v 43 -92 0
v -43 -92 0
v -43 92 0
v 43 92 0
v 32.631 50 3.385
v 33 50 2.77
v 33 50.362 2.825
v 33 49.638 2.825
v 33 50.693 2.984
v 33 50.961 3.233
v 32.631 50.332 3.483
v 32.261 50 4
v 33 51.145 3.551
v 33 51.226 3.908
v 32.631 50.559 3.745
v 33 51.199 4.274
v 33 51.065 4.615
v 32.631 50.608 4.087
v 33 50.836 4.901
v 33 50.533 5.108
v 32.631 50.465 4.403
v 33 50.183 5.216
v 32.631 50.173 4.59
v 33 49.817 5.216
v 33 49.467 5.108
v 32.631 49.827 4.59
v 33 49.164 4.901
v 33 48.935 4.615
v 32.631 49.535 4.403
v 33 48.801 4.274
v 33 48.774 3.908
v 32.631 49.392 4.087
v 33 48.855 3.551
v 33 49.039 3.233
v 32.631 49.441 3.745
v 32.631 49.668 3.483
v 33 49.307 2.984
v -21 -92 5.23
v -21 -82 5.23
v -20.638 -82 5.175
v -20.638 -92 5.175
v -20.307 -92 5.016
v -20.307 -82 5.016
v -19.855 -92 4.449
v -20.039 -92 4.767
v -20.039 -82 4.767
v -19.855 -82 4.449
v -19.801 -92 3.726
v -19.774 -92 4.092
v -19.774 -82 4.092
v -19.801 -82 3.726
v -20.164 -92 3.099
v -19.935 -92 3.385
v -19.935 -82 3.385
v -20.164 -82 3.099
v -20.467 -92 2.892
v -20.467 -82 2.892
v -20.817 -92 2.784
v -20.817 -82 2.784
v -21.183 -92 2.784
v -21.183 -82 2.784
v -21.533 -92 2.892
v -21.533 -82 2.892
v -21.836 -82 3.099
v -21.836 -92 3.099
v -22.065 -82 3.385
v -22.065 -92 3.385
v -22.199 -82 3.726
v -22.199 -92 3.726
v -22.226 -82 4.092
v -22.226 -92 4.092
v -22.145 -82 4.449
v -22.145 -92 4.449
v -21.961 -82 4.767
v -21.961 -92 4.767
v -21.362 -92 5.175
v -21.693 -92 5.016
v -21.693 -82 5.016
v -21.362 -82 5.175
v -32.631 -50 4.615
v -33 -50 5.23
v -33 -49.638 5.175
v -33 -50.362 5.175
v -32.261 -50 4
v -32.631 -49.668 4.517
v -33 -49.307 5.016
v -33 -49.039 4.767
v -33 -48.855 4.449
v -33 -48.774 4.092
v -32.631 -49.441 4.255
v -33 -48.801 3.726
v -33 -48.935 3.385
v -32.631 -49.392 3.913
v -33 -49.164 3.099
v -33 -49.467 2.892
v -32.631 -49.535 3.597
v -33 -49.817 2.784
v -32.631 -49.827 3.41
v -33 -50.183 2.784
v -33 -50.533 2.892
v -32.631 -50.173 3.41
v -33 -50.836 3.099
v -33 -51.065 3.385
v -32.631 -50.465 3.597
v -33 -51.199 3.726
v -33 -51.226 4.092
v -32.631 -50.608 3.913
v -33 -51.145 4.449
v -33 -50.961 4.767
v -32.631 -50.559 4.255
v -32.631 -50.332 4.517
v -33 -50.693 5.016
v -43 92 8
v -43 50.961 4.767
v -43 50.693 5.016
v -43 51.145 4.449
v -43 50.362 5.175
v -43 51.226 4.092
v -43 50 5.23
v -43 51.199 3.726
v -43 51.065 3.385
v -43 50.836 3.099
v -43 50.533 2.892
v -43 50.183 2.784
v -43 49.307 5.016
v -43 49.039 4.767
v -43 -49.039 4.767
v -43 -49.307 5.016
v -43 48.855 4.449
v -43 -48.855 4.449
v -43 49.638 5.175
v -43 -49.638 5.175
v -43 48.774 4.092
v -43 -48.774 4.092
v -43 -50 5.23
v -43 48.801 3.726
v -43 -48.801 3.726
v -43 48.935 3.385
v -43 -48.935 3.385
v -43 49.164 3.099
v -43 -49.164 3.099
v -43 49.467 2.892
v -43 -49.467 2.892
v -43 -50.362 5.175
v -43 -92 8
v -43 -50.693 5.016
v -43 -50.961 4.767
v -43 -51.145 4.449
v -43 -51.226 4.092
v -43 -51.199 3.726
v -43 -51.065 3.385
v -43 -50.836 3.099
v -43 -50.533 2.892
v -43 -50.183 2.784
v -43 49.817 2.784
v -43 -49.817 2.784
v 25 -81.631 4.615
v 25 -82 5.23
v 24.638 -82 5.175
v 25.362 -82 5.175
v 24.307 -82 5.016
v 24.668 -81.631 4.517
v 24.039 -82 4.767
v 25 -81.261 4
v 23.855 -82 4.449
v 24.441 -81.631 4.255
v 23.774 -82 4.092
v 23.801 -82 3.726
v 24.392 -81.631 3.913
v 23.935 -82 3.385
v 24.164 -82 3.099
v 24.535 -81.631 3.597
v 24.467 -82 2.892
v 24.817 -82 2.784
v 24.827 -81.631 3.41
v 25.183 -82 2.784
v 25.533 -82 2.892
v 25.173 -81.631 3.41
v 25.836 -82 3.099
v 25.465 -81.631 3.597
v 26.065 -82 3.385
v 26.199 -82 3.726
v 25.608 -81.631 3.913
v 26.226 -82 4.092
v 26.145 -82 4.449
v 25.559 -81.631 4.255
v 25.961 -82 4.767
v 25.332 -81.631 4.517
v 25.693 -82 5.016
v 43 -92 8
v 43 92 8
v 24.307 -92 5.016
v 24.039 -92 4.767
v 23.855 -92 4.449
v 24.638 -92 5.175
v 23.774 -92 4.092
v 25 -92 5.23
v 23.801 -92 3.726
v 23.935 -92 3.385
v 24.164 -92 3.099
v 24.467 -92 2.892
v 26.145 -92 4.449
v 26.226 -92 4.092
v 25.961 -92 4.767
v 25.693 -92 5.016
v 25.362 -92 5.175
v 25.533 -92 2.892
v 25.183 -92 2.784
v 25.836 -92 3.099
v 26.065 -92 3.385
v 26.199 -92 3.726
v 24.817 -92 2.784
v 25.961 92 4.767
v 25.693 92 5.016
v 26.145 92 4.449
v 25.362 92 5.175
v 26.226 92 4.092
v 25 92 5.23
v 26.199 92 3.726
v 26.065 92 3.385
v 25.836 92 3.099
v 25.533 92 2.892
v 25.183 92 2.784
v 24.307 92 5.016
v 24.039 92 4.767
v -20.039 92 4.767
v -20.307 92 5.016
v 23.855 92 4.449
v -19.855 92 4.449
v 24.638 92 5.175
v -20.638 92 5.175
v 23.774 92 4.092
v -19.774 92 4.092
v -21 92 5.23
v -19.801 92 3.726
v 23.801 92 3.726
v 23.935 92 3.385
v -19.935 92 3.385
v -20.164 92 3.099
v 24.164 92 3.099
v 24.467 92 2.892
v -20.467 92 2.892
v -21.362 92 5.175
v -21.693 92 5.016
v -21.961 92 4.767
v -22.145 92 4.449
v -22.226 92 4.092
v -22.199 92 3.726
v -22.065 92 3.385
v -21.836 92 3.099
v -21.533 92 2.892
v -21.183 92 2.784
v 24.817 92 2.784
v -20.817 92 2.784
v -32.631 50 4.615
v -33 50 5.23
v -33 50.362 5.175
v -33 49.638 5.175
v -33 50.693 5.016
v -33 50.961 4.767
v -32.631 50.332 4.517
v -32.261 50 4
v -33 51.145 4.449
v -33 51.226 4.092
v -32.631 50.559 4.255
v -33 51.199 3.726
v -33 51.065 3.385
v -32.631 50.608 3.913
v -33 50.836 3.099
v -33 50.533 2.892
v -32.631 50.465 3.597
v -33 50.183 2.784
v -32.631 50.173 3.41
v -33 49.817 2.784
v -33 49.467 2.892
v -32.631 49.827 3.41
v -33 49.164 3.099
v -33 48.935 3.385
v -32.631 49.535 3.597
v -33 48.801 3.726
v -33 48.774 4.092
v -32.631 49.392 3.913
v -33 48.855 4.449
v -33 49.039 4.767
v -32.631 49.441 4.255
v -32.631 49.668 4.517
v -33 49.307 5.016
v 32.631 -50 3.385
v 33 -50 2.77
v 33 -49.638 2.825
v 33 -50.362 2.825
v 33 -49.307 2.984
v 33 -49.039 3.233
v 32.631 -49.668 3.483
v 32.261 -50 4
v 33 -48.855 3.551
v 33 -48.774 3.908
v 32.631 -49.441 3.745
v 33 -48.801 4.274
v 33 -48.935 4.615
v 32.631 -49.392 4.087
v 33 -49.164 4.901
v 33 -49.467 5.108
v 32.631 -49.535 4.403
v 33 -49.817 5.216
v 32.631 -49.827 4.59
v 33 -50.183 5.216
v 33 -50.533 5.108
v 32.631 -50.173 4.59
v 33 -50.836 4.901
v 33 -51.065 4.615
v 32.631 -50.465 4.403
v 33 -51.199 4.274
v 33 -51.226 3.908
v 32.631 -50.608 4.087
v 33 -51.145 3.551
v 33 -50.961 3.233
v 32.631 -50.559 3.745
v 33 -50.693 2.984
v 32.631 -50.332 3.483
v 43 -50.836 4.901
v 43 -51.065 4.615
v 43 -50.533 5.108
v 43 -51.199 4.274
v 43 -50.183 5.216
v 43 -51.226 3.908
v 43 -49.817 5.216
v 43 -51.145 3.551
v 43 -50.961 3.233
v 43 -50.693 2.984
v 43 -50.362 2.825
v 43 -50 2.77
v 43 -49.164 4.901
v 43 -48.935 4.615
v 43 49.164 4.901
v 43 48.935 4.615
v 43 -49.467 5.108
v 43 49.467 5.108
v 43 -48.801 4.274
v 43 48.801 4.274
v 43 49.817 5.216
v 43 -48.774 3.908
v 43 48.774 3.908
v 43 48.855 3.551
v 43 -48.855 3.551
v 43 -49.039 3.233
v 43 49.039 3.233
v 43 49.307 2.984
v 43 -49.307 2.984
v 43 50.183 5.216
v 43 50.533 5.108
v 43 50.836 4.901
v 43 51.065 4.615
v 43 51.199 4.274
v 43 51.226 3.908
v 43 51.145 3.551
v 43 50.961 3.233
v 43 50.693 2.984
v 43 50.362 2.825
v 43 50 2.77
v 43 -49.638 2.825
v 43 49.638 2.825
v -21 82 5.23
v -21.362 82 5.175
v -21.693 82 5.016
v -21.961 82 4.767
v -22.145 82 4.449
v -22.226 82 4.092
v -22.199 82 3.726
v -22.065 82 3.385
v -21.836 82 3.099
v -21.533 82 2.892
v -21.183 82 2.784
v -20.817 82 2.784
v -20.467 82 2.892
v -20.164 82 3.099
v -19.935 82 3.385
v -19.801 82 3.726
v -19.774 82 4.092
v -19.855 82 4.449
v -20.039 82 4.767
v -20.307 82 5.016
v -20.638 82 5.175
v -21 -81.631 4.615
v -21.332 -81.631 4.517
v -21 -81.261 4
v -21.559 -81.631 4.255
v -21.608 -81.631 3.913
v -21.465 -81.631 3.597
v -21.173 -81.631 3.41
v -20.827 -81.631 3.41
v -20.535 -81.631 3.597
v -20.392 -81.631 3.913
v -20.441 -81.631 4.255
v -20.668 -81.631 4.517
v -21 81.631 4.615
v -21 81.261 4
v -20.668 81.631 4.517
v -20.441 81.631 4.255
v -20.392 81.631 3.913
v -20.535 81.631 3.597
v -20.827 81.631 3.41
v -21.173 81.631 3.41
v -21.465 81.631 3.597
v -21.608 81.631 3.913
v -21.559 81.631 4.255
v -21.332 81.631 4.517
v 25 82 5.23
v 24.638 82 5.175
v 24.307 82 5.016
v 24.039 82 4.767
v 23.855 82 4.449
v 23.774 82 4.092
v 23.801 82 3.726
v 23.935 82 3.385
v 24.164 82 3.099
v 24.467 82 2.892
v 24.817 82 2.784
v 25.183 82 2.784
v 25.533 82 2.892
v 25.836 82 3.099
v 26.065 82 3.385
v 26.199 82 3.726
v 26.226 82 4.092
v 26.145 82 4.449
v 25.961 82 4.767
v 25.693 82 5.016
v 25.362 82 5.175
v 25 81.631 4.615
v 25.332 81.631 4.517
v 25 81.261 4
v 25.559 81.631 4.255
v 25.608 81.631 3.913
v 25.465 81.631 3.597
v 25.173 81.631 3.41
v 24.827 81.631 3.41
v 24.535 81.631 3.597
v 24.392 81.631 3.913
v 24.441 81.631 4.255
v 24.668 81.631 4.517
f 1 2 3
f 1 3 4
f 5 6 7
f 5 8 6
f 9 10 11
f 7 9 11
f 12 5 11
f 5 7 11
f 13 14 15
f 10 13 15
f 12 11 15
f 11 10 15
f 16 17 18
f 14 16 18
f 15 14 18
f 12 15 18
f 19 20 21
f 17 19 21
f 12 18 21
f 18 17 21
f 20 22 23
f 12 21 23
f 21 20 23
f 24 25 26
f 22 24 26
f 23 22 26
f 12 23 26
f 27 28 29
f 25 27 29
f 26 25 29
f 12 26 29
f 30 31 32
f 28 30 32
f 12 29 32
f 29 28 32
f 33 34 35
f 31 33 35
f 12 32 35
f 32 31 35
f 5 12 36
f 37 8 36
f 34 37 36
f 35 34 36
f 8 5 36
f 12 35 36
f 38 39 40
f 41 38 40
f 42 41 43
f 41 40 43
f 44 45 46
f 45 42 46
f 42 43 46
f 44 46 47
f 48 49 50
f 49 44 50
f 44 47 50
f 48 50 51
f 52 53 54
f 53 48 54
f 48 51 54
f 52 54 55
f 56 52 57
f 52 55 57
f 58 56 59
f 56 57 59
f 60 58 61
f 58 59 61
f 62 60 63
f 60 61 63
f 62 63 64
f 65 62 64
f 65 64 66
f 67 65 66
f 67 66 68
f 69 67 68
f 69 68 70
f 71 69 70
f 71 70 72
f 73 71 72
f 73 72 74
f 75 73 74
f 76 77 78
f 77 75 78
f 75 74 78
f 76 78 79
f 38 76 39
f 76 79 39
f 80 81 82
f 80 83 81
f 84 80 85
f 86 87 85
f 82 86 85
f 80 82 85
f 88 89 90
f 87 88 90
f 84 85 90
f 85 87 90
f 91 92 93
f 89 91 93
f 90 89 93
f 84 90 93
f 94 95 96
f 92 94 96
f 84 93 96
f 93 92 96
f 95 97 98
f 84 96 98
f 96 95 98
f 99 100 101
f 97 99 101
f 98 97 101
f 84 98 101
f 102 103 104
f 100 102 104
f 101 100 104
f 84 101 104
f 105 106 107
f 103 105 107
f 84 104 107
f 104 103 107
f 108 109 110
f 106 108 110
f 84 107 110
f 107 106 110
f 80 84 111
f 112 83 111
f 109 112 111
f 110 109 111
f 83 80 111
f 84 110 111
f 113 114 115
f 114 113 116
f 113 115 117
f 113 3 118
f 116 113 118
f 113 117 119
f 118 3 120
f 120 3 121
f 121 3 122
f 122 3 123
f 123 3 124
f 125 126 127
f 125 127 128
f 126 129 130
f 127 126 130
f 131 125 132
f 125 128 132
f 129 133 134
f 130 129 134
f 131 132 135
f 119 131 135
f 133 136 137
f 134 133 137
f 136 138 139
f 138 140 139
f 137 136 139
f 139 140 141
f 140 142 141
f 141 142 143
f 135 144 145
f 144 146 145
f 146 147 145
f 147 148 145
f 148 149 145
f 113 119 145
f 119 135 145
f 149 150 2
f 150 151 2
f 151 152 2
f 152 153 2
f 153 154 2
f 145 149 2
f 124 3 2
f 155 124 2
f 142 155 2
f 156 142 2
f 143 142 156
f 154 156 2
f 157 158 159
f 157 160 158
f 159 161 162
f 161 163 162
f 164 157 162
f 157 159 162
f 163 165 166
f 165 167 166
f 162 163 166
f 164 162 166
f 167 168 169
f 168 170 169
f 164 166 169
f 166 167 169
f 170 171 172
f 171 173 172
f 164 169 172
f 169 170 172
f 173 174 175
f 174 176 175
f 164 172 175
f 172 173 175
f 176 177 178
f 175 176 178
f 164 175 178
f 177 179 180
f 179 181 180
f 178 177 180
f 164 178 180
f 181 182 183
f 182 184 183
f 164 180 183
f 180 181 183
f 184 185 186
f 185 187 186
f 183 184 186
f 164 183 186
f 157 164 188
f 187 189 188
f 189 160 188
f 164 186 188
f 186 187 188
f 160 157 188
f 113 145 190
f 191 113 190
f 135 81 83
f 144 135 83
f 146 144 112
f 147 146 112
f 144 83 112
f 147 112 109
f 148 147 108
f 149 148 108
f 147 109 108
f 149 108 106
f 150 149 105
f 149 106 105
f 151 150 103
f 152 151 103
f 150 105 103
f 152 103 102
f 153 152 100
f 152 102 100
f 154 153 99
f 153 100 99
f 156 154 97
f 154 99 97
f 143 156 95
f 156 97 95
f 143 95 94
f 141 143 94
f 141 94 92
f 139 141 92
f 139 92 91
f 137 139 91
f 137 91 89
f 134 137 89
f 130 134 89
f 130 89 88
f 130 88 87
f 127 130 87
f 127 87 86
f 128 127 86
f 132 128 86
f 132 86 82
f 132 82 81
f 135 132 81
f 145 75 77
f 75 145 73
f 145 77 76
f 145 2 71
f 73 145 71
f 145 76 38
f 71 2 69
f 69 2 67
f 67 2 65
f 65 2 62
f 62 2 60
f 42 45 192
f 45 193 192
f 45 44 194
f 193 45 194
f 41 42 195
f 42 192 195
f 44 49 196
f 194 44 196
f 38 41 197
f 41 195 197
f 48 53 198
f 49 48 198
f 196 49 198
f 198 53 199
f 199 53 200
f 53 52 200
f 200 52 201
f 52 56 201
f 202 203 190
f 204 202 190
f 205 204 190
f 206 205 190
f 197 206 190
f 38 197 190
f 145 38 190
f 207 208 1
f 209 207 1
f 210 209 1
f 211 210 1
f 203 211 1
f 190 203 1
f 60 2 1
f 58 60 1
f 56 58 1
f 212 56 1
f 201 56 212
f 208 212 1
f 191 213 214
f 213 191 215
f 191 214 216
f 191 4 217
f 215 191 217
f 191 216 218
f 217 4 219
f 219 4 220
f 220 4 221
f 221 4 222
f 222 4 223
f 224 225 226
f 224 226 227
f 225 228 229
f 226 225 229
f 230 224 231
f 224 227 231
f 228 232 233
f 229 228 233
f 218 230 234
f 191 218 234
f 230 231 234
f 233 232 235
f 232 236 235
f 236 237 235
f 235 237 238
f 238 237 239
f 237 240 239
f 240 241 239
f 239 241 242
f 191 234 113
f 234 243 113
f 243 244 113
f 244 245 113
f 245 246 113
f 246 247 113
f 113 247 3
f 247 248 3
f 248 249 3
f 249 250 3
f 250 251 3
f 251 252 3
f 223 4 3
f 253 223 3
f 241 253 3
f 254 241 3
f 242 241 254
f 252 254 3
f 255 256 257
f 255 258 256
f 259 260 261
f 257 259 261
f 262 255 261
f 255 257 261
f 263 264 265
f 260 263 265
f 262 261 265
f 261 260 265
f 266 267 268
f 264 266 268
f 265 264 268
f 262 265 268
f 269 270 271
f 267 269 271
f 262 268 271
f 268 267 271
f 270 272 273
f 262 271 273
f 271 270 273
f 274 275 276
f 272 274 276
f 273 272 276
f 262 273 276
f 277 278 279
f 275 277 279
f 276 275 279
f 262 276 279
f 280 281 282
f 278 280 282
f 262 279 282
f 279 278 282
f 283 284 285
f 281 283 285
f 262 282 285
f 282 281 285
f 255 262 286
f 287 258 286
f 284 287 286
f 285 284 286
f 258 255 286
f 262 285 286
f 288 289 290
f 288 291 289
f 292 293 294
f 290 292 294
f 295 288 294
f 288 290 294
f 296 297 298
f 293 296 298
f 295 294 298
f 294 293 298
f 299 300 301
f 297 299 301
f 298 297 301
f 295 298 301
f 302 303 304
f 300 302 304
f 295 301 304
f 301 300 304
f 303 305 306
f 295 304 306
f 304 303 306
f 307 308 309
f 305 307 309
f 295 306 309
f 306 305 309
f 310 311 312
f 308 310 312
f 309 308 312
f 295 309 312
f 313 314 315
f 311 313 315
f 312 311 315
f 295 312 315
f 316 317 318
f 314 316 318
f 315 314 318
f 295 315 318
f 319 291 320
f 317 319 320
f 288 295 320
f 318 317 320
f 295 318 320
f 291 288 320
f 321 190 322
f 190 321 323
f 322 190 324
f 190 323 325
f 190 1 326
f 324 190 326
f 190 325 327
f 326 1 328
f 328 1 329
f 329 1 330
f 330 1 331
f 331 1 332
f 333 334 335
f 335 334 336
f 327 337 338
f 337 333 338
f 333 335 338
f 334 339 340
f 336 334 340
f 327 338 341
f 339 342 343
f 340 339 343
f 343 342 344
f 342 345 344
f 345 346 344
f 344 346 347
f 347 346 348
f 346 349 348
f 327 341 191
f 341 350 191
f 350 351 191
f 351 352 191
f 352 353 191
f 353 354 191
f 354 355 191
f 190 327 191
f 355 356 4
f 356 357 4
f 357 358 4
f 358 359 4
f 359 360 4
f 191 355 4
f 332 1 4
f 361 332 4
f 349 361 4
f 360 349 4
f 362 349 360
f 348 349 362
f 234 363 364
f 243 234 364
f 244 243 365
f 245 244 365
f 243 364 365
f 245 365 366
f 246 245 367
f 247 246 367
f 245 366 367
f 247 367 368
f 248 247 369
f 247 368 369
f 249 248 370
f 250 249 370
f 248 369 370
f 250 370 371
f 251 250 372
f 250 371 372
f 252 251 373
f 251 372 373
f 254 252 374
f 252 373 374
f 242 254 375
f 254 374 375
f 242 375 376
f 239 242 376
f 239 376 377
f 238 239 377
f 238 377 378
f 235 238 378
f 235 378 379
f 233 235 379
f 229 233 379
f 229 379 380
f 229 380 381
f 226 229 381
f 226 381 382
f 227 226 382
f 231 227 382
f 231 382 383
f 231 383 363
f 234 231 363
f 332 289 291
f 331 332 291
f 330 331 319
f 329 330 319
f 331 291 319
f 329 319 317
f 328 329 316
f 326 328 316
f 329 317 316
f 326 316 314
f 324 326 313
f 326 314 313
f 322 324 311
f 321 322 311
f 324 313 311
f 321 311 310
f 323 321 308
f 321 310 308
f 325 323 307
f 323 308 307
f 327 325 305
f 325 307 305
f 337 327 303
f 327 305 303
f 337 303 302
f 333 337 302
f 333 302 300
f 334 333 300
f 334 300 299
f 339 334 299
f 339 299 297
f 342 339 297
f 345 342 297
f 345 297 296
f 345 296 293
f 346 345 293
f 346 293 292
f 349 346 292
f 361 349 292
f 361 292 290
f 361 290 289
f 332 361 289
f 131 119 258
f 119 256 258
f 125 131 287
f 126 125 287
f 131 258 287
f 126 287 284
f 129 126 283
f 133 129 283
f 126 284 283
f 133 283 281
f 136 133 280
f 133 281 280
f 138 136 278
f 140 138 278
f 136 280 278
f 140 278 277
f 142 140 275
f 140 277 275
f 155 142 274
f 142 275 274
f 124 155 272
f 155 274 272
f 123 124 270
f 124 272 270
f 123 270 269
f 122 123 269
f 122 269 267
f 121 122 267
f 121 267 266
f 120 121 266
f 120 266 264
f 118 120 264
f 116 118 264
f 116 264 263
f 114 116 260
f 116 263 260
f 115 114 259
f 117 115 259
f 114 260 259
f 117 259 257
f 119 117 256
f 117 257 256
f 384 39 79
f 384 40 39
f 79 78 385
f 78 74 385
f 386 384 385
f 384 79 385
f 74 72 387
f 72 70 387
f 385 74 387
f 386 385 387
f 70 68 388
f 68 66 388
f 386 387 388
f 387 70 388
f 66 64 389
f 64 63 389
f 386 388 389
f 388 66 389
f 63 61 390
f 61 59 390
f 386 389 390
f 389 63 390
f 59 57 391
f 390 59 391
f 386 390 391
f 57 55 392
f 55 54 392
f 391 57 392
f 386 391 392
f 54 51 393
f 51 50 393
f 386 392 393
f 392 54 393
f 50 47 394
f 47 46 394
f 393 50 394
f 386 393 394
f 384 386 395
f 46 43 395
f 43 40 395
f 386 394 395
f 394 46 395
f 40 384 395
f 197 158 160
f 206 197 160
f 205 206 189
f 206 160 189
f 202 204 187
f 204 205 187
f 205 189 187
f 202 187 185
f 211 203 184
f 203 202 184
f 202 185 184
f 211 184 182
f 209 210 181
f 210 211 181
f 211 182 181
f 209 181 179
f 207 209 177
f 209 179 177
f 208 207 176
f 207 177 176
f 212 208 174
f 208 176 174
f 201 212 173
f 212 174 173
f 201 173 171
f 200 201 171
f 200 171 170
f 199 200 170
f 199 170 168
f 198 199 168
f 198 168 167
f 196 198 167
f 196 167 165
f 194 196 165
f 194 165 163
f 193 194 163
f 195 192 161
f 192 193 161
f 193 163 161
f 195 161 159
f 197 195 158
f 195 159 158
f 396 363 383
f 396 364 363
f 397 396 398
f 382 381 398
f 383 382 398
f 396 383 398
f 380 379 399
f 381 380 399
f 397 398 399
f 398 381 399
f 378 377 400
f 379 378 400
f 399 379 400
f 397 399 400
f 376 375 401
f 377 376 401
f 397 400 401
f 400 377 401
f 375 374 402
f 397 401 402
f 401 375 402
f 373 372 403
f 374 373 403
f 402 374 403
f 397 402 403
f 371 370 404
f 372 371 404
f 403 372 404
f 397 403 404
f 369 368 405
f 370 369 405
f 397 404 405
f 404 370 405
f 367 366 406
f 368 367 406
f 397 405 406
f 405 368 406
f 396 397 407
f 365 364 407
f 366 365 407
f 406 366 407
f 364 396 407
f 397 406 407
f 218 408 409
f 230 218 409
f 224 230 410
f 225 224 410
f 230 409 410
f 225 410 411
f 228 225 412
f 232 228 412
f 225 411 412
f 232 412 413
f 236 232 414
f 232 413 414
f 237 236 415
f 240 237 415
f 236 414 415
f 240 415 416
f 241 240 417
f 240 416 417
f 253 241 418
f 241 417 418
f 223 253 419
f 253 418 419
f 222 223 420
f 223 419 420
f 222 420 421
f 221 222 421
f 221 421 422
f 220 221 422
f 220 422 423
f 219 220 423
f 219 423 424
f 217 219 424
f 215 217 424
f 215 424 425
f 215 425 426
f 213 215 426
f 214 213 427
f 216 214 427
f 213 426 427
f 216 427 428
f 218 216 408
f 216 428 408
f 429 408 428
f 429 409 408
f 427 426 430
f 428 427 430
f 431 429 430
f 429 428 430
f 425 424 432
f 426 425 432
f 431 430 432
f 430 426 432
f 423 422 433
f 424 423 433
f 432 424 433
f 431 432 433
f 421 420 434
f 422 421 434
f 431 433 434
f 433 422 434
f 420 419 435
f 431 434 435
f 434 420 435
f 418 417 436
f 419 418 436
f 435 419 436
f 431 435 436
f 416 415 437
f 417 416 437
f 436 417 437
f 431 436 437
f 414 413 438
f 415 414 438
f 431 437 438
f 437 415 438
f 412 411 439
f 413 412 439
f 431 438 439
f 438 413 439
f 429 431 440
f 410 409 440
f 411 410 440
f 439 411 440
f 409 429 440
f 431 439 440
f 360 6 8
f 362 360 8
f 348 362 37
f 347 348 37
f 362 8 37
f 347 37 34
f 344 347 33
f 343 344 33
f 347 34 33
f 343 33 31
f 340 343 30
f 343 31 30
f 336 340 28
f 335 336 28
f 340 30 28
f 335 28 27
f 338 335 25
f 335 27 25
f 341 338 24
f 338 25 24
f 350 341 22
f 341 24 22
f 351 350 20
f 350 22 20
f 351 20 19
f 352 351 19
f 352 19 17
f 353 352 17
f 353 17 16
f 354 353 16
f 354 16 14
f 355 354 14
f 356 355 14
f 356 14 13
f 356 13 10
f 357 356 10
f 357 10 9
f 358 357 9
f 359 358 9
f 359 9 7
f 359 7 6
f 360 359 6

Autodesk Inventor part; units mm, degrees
ref_plane "YZ Plane" through (0, 0, 0) normal (1, 0, 0) x (0, 1, 0)
ref_plane "XZ Plane" through (0, 0, 0) normal (0, 1, 0) x (-1, 0, 0)
ref_plane "XY Plane" through (0, 0, 0) normal (0, 0, 1) x (1, 0, 0)
sketch "Skizze1" plane through (0, 0, 0) normal (0, 0, 1) x (1, 0, 0)
  line L0 (0, 128.8) -> (0, -128.8) projected
  line L1 (-60.2, 0) -> (60.2, 0) projected
  line L2 (43, 92) -> (-43, 92)
  line L3 (-43, 92) -> (-43, -92)
  line L4 (-43, -92) -> (43, -92)
  line L5 (43, -92) -> (43, 92)
  point P0 (0, 0)
  point P1 (43, 0)
  point P2 (0, 92)
  dimension "d0" = 184
  dimension "d1" = 86
extrude "Extrusion1" add sketch "Skizze1" along normal blind 8
sketch "Skizze2" plane through (-43, -92, 0) normal (-1, 0, 0) x (0, 0, 1)
  circle A0 centre (-277.5, 142) radius 3.1 projected
  circle A1 centre (-52, 188) radius 3.1 projected
  circle A2 centre (-221.5, 188) radius 3.1 projected
  circle A3 centre (4, 142) radius 3.1 projected
  circle A4 centre (-277.5, 42) radius 3.1 projected
  circle A5 centre (4, 42) radius 3.1 projected
  circle A6 centre (-221.5, -4) radius 3.1 projected
  circle A7 centre (-52, -4) radius 3.1 projected
  line L0 (8, 192) -> (8, -8) projected
  line L1 (8, 192) -> (-281.5, 192) projected
  line L2 (-281.5, 192) -> (-281.5, 115) projected
  line L3 (-281.5, 115) -> (-333.5, 115) projected
  line L4 (-333.5, 115) -> (-333.5, 69) projected
  line L5 (-281.5, 69) -> (-333.5, 69) projected
  line L6 (-281.5, -8) -> (-281.5, 69) projected
  line L7 (8, -8) -> (-281.5, -8) projected
  point P0 (0, 92)
hole "Bohrung1" at (-43, 50, 4) at (-43, -50, 4) direction (1, 0, 0) diameter 2.459 depth 10 tip angle 118 thread size "M3x0.5" class "6H" standard "ISO Metric profile"
sketch "Skizze3" plane through (-43, 92, 0) normal (0, 1, 0) x (1, 0, 0)
  circle A0 centre (68, -4) radius 3.1 projected
  circle A1 centre (22, -4) radius 3.1 projected
  line L0 (0, -8) -> (0, 273.5) projected
  line L1 (86, -8) -> (0, -8) projected
  line L2 (86, 273.5) -> (86, -8) projected
  line L3 (0, 273.5) -> (86, 273.5) projected
  point P0 (43, 0)
hole "Bohrung2" at (-21, 92, 4) at (25, 92, 4) direction (0, -1, 0) diameter 2.459 depth 10 tip angle 118 thread size "M3x0.5" class "6H" standard "ISO Metric profile"
mirror "Spiegeln1" about plane through (0, 0, 0) normal (0, 1, 0) of "Bohrung2"
sketch "Skizze4" plane through (43, -92, 0) normal (1, 0, 0) x (0, 0, -1)
  circle A0 centre (-4, 142) radius 3.1 projected
  circle A1 centre (-4, 42) radius 3.1 projected
  point P0 (0, 92)
hole "Bohrung3" at (43, 50, 4) at (43, -50, 4) direction (-1, 0, 0) diameter 2.459 depth 10 tip angle 118 thread size "M3x0.5" class "6H" standard "ISO Metric profile"
properties part number "Wand5" material "Polycarbonate, Smoke"
